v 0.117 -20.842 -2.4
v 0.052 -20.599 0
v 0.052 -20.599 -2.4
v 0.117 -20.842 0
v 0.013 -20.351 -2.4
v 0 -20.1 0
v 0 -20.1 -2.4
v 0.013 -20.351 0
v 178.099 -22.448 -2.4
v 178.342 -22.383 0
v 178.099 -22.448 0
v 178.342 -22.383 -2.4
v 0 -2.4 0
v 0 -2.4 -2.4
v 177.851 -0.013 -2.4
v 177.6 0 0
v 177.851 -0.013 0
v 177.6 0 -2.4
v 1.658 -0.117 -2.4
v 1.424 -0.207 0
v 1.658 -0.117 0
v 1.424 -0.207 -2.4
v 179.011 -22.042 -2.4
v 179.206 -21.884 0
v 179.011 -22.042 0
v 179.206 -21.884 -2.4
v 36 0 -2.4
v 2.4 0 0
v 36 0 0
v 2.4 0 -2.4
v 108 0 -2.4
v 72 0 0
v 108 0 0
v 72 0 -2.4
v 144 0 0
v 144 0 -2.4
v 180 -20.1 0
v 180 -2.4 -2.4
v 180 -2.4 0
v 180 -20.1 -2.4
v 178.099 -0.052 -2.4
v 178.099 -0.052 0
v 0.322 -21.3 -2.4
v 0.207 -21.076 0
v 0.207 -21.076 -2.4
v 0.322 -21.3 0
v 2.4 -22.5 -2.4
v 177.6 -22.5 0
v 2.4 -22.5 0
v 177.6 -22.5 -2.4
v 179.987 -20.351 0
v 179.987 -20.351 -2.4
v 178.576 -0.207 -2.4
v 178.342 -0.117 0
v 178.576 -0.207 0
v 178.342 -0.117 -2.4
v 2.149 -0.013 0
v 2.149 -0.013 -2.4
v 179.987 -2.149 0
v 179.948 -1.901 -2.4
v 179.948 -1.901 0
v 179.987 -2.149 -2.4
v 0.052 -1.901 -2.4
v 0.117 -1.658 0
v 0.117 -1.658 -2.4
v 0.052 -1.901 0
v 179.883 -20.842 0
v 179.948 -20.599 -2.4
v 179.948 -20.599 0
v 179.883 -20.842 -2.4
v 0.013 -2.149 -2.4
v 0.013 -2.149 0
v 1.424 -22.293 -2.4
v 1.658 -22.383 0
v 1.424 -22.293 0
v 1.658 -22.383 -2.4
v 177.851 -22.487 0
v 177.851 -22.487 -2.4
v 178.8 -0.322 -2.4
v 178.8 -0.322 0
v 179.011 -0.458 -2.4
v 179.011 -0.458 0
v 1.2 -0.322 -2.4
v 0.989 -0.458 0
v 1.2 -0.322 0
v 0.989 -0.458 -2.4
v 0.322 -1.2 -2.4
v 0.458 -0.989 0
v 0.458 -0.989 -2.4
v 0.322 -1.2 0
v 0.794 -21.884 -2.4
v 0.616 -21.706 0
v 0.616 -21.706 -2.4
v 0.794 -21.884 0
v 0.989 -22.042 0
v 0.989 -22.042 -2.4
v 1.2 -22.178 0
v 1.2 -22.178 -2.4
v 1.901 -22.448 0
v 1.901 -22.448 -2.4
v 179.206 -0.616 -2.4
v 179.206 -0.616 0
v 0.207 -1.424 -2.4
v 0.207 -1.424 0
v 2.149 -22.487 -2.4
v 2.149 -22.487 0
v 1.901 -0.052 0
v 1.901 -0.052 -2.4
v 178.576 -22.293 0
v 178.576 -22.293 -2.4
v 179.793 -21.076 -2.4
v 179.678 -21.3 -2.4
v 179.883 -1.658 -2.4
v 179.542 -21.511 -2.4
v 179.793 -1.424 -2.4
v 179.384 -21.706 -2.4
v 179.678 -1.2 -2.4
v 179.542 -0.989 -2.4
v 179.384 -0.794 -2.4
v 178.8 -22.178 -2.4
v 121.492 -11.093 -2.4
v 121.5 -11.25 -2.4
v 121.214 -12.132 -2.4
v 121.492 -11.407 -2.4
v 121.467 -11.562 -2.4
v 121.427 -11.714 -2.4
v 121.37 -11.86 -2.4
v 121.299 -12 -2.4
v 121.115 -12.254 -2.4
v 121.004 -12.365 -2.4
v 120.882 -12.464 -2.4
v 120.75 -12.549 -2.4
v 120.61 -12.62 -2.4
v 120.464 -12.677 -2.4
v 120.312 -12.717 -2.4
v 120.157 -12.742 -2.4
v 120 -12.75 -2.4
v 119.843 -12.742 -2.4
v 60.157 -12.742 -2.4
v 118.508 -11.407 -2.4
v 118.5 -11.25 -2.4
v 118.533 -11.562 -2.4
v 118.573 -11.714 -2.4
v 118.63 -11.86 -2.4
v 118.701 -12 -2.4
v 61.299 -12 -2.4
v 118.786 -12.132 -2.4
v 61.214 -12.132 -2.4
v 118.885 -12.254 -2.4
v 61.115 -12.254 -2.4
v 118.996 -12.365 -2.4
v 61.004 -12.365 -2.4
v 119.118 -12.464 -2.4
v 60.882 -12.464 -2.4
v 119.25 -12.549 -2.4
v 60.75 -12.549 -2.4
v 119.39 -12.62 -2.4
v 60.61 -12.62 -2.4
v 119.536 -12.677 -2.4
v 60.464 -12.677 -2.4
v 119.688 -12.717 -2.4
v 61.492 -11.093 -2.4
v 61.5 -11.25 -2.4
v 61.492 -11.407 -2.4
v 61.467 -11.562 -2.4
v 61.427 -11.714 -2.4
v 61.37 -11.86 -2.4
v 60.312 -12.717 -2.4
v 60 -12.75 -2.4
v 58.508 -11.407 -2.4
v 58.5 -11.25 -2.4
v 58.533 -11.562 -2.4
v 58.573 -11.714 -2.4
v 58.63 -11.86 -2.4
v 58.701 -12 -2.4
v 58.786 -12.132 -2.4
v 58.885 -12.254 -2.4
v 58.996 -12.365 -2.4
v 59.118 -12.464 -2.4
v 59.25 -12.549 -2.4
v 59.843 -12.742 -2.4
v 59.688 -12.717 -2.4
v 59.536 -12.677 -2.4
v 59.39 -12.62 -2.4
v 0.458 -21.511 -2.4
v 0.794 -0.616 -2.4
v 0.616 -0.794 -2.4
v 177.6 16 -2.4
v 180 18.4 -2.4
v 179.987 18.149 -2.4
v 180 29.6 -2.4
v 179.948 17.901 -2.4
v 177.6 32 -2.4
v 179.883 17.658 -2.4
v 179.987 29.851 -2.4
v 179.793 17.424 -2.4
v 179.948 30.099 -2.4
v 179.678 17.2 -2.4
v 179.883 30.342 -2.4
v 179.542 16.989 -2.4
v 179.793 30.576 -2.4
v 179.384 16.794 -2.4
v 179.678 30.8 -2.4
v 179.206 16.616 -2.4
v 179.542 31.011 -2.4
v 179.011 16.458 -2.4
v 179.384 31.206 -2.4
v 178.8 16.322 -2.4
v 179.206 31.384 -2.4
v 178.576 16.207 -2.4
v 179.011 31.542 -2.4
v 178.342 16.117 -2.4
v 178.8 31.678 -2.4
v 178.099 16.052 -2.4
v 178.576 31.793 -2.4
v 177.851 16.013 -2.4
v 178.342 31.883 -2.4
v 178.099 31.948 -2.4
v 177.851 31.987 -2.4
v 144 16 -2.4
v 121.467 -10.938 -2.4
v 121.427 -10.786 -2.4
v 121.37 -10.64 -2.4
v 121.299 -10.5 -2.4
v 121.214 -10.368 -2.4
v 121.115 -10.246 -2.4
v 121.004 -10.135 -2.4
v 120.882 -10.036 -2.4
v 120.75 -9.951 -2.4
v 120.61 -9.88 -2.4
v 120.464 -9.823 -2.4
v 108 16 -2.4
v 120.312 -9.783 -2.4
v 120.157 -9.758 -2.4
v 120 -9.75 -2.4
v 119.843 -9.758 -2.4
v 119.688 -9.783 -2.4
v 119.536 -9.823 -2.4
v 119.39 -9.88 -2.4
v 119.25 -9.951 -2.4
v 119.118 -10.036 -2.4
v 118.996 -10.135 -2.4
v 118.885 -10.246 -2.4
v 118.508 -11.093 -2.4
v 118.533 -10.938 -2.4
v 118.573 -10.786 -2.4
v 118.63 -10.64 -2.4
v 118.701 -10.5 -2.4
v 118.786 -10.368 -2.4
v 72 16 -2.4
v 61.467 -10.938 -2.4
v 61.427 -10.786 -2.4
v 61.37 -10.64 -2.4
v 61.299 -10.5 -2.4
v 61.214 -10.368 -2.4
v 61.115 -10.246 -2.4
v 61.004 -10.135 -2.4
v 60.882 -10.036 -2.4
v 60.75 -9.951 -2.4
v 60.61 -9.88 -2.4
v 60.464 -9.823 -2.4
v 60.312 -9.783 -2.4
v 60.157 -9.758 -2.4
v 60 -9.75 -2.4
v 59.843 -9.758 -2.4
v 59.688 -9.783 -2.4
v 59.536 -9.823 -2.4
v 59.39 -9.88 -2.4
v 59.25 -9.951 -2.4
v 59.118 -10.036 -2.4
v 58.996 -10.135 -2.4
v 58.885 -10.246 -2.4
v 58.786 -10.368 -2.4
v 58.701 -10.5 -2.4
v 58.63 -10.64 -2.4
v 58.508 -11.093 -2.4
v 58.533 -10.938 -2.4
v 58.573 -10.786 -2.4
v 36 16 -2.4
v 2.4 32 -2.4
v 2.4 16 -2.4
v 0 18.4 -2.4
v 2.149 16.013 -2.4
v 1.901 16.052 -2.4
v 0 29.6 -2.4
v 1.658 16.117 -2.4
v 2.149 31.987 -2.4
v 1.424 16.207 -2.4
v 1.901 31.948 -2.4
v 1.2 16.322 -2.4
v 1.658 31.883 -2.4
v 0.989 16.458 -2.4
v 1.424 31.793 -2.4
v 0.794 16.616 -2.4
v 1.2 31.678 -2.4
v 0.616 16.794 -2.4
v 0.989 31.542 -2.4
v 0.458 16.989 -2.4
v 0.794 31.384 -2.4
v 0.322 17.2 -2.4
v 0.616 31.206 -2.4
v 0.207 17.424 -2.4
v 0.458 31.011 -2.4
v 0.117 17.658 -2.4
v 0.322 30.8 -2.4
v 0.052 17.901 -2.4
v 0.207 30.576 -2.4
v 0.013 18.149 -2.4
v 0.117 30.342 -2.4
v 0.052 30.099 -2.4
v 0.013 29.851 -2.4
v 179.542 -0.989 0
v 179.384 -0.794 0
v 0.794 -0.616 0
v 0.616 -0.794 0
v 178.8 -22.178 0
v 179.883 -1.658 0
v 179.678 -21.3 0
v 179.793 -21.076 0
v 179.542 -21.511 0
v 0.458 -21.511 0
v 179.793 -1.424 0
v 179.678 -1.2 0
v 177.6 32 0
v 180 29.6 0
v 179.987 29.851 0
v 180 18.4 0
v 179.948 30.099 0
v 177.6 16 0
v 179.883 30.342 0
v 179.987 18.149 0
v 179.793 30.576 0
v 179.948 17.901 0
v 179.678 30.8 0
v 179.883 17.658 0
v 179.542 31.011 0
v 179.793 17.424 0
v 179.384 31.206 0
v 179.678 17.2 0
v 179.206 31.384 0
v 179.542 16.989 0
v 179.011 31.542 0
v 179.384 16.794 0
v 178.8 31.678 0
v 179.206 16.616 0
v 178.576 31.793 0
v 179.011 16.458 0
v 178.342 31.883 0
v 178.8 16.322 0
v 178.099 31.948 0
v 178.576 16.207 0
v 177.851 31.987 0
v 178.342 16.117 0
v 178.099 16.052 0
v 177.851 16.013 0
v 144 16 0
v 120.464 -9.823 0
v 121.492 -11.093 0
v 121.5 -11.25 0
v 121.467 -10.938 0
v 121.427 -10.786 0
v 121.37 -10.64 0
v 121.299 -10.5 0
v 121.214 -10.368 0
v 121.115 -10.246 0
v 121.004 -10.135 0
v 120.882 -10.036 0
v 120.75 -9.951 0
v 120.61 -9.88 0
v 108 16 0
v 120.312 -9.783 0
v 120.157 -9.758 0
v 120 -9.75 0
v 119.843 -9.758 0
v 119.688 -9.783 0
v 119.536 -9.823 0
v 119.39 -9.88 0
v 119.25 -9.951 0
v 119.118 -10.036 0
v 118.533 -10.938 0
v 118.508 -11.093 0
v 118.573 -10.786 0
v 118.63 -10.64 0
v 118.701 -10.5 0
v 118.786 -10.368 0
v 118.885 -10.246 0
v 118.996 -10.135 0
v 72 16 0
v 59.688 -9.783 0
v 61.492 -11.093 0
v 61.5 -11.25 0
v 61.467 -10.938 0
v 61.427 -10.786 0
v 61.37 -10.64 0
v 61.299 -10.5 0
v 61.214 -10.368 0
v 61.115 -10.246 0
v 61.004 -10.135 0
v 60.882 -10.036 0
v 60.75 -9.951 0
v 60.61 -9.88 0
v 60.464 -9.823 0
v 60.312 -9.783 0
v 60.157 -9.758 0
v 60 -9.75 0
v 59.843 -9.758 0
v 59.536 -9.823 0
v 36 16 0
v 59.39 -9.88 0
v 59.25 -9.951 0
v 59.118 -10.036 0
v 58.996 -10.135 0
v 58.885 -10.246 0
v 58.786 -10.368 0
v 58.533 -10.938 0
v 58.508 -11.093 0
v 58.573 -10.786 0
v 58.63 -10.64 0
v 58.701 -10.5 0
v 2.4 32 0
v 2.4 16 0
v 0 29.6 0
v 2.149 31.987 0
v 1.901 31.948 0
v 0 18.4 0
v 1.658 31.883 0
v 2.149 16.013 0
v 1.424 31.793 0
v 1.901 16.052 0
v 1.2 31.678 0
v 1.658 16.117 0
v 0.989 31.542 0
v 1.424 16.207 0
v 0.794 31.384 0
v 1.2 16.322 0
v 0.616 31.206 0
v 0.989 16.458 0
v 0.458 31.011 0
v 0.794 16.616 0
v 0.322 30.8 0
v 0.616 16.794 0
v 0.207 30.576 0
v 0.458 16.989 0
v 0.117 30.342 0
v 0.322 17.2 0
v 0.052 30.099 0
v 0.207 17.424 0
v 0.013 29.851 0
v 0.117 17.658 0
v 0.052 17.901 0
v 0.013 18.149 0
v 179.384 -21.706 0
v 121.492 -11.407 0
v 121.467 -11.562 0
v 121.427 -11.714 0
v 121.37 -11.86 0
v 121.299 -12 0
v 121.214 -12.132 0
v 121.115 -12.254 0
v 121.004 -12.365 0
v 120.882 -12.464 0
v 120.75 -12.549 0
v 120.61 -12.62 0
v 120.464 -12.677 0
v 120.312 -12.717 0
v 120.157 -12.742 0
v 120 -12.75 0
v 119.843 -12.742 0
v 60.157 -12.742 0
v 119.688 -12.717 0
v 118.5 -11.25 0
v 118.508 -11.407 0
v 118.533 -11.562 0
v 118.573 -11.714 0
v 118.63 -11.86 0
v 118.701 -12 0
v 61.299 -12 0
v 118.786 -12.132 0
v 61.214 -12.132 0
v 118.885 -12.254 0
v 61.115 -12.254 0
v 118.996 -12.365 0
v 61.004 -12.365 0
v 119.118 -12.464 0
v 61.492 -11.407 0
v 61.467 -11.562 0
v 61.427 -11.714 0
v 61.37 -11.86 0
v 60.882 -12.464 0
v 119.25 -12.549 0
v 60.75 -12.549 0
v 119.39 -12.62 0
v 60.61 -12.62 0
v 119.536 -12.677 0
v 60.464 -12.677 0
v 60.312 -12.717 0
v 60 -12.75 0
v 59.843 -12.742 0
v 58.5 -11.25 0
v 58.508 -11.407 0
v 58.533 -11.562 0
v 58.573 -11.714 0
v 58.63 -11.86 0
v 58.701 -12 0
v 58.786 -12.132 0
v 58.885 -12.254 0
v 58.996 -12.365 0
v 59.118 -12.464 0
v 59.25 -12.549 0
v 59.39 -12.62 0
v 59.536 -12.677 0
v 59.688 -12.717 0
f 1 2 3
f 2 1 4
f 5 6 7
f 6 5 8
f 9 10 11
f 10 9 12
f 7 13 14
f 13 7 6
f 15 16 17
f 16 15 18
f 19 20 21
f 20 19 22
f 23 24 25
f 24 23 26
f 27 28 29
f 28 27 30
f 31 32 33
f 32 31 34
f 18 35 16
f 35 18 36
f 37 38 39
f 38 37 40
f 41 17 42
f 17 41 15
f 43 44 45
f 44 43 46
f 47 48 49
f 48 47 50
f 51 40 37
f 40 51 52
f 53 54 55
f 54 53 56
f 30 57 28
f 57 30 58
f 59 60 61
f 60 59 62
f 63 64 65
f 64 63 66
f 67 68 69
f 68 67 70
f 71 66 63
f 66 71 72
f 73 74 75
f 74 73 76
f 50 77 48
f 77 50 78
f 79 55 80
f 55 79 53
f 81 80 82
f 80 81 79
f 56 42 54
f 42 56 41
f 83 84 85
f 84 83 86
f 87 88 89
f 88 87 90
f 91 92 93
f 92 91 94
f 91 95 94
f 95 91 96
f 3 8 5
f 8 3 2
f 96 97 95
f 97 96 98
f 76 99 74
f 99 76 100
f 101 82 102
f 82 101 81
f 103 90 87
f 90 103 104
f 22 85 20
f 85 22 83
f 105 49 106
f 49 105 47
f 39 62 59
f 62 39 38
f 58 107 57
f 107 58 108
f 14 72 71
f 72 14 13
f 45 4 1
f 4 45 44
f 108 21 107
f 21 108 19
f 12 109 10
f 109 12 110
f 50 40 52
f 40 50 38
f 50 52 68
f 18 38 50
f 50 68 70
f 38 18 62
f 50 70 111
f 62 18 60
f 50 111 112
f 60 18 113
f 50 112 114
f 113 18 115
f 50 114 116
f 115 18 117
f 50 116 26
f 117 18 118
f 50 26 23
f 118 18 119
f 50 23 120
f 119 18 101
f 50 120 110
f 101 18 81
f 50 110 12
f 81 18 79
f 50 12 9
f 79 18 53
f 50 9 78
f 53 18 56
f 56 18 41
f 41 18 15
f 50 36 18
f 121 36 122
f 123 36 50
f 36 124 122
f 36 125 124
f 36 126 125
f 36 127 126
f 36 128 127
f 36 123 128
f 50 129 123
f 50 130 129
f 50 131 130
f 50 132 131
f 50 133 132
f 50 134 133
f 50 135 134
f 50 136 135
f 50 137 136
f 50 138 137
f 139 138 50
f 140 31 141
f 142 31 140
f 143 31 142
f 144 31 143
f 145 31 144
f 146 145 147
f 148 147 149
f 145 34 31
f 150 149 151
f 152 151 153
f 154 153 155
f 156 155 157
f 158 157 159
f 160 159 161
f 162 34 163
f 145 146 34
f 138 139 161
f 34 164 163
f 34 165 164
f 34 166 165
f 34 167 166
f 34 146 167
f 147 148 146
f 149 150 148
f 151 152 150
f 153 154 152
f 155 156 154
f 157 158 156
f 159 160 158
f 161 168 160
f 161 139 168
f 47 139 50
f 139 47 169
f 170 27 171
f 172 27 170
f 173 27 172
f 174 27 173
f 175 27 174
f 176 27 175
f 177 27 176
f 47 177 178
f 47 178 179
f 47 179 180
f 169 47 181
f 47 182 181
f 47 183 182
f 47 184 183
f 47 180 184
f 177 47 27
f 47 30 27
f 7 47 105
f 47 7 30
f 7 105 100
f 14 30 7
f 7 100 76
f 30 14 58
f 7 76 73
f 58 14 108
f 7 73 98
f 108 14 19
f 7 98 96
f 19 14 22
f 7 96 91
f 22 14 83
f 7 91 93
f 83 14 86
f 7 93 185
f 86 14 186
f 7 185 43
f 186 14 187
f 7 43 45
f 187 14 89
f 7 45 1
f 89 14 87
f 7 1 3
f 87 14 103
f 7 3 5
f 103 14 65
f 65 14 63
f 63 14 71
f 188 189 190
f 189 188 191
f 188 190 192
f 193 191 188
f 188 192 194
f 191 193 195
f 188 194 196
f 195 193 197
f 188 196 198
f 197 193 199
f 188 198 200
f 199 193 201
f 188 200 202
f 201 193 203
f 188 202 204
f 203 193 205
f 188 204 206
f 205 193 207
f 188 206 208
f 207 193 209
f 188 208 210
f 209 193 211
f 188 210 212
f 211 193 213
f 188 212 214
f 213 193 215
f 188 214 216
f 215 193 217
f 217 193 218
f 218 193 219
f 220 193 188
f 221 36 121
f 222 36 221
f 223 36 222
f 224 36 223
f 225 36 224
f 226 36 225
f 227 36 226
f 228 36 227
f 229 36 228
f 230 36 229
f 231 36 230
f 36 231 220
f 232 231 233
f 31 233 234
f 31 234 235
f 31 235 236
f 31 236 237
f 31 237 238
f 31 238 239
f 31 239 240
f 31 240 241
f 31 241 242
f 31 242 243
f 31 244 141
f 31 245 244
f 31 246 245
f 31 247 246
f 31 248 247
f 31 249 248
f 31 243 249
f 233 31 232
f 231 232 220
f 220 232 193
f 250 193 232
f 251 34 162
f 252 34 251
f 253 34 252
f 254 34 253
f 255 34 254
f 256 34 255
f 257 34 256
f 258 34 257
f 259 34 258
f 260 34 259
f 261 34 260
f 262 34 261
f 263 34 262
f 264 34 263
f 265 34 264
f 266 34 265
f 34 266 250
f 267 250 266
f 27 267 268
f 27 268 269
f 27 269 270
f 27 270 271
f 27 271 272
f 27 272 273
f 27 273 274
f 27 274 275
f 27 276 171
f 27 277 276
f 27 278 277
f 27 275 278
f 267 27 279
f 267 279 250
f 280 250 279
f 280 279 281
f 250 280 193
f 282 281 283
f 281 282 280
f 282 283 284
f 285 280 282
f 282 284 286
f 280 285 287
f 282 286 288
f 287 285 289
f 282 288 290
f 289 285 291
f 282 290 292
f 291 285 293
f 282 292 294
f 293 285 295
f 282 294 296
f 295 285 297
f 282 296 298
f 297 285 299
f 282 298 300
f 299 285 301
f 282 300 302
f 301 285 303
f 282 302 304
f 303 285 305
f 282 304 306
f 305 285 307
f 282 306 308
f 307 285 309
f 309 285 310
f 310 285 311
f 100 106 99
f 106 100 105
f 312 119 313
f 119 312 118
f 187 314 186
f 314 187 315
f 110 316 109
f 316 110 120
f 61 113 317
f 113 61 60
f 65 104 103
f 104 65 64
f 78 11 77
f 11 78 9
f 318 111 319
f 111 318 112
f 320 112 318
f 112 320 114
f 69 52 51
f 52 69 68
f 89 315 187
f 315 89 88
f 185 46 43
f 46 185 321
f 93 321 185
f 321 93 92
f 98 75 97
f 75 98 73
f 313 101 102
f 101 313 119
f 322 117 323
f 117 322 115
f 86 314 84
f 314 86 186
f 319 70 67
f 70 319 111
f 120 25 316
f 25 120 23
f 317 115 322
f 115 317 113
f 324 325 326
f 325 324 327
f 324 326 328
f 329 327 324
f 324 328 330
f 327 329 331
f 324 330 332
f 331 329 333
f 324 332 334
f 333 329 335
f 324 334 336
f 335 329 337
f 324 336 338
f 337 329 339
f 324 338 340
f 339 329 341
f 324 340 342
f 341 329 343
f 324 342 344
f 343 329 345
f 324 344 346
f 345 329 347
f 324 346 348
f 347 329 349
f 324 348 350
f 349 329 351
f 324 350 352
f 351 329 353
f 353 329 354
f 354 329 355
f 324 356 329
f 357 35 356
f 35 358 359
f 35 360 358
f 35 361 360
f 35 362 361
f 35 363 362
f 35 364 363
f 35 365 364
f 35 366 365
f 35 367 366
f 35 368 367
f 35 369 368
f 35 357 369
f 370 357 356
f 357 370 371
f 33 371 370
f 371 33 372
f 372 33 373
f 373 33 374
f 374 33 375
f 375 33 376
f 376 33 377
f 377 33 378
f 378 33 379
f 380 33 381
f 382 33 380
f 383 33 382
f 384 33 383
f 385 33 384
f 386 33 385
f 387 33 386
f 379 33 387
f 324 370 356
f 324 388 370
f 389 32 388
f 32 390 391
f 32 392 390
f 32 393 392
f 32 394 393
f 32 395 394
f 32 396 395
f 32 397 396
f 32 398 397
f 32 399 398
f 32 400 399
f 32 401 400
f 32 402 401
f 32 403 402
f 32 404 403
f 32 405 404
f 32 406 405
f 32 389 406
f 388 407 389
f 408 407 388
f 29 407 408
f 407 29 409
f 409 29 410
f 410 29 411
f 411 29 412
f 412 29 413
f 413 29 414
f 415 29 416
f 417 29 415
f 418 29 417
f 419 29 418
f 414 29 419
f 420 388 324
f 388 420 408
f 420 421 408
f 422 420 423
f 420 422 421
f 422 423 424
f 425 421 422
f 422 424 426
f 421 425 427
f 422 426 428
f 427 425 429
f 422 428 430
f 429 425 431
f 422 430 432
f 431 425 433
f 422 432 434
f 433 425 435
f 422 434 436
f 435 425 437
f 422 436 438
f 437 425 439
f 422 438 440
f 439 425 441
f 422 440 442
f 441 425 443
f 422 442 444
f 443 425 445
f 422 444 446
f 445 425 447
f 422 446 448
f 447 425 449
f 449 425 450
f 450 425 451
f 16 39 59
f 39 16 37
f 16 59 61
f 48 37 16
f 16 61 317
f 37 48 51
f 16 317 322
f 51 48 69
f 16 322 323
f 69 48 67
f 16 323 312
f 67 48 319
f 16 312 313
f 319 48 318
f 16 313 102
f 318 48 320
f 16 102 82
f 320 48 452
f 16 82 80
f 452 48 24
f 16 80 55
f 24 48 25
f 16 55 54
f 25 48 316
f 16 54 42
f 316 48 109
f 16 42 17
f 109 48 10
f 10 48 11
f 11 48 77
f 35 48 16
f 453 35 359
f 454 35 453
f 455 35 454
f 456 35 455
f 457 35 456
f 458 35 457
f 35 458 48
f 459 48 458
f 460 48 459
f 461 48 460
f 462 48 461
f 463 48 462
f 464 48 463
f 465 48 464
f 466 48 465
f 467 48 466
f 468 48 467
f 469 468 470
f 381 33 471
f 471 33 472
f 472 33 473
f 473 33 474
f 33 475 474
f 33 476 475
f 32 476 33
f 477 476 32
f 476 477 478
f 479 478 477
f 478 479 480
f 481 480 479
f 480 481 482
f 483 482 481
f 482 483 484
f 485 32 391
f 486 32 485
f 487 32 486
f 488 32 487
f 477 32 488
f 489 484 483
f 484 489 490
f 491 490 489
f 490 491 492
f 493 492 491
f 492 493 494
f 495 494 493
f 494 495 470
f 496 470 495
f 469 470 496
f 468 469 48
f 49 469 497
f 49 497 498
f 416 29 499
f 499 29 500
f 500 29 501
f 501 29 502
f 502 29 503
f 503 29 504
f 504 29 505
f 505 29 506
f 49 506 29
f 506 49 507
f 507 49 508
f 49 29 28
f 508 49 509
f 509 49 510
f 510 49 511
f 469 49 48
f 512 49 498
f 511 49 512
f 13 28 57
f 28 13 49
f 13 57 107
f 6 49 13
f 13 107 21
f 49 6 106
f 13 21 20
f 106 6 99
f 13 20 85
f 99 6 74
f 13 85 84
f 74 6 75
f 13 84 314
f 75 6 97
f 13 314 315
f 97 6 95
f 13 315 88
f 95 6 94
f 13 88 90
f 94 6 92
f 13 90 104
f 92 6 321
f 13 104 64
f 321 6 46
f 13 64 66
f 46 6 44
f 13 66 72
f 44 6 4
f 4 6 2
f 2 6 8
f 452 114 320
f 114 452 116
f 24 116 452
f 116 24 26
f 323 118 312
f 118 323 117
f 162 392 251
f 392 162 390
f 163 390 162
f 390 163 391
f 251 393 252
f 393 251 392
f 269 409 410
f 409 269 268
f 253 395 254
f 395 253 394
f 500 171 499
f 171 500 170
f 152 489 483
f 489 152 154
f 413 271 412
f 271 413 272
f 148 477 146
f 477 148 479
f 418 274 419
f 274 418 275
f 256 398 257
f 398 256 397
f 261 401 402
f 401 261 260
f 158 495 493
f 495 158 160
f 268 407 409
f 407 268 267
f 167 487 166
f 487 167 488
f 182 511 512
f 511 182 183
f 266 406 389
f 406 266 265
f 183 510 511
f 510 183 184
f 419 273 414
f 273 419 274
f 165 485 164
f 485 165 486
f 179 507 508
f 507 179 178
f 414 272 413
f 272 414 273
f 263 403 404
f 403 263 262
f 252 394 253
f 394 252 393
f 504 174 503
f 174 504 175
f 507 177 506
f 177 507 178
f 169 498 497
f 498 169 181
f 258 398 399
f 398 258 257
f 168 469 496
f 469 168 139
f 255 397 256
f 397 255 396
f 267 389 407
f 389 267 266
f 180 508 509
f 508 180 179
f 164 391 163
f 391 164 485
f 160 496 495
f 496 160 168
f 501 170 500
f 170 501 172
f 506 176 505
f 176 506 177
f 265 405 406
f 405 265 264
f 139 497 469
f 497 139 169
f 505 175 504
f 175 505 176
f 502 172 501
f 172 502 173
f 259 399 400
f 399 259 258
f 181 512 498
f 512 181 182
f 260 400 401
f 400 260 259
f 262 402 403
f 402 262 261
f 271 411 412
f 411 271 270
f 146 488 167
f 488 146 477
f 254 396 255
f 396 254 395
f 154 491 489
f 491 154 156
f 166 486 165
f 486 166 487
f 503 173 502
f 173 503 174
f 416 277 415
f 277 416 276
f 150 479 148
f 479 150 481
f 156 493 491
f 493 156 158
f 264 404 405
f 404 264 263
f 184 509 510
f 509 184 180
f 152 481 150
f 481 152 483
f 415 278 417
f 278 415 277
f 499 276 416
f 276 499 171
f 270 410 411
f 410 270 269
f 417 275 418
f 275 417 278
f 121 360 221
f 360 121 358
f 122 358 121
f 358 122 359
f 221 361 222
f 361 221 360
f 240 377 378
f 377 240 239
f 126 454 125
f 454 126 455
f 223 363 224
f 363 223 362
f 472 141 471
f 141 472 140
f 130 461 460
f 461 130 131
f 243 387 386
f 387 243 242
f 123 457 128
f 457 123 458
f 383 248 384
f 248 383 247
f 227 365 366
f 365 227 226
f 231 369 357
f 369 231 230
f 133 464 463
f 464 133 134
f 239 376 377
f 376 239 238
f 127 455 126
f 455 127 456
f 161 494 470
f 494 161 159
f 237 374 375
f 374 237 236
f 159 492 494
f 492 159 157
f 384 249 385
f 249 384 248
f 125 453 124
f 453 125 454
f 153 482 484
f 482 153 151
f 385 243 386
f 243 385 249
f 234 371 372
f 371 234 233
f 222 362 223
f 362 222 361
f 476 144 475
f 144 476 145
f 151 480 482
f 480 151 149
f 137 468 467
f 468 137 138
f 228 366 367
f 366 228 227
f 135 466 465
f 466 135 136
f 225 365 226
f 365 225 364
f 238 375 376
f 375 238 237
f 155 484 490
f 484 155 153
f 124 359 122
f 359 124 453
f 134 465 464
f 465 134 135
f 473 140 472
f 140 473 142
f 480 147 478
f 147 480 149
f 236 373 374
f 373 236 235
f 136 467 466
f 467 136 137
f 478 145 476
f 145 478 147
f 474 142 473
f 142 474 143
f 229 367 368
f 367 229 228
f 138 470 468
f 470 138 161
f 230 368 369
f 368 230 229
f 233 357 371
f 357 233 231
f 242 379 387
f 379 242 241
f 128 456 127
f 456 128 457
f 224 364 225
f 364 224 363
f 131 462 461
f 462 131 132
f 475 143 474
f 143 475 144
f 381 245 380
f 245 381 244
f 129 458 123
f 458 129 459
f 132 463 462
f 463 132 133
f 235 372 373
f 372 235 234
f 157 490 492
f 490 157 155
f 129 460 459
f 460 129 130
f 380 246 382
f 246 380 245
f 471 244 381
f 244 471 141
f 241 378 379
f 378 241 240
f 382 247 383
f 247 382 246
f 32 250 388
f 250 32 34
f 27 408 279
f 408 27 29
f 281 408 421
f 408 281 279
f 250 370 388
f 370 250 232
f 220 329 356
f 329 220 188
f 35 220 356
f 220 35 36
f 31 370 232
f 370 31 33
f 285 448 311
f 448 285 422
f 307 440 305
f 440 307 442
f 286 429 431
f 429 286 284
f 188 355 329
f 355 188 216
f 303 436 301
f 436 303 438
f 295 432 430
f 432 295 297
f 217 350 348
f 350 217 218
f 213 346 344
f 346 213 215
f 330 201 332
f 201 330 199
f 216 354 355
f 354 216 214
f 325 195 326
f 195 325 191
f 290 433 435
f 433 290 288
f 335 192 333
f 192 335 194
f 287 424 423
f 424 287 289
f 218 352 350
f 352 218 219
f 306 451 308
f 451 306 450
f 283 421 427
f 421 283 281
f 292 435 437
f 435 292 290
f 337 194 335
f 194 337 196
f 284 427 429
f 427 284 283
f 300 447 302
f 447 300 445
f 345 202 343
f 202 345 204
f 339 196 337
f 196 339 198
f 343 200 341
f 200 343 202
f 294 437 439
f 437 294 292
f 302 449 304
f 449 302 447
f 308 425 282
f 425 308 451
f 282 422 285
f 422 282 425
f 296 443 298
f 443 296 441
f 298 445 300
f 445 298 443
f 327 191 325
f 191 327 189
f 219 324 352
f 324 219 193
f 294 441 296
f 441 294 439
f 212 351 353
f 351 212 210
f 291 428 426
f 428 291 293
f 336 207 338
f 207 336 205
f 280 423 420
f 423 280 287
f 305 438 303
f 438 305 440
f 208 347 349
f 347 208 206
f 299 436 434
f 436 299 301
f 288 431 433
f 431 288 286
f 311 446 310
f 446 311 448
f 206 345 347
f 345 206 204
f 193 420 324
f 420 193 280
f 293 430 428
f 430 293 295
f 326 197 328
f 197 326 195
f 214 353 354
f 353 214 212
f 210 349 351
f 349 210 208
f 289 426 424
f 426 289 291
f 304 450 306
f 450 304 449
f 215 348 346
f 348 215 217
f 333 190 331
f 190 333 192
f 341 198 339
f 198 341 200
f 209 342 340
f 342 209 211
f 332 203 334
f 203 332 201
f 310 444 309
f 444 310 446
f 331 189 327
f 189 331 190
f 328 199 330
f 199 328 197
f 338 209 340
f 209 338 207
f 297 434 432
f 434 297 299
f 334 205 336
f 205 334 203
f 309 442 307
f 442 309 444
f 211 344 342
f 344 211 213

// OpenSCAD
$fn=60;

rail_length = 180;
rail_height = 32;
rail_base = 22.5;
rail_depth = 2.4;
screw_diameter = 3.0;

module posts(x, y, z, r)
{
    translate([ r,   r,   0 ])  cylinder(r = r, h = z);
    translate([ r,   y-r, 0 ])  cylinder(r = r, h = z);
    translate([ x-r, r,   0 ])  cylinder(r = r, h = z);
    translate([ x-r, y-r, 0 ])  cylinder(r = r, h = z);
}

difference() {
  translate([0, -rail_base, -rail_depth])
    hull()
    posts(x=rail_length, y=rail_base, z=rail_depth, r=rail_depth);

  translate([rail_length*1/3, -rail_base/2, -rail_depth-0.01])
    cylinder(r=screw_diameter/2, h=rail_depth+0.02);

  translate([rail_length*2/3, -rail_base/2, -rail_depth-0.01])
    cylinder(r=screw_diameter/2, h=rail_depth+0.02);
}

translate([rail_length*1/5, 0, -rail_depth])
  cube([rail_length*1/5, rail_height*1/2, rail_depth]);

translate([rail_length*3/5, 0, -rail_depth])
  cube([rail_length*1/5, rail_height*1/2, rail_depth]);

translate([0, rail_height*1/2, -rail_depth])
  hull()
  posts(x=rail_length, y=rail_height/2, z=rail_depth, r=rail_depth);
